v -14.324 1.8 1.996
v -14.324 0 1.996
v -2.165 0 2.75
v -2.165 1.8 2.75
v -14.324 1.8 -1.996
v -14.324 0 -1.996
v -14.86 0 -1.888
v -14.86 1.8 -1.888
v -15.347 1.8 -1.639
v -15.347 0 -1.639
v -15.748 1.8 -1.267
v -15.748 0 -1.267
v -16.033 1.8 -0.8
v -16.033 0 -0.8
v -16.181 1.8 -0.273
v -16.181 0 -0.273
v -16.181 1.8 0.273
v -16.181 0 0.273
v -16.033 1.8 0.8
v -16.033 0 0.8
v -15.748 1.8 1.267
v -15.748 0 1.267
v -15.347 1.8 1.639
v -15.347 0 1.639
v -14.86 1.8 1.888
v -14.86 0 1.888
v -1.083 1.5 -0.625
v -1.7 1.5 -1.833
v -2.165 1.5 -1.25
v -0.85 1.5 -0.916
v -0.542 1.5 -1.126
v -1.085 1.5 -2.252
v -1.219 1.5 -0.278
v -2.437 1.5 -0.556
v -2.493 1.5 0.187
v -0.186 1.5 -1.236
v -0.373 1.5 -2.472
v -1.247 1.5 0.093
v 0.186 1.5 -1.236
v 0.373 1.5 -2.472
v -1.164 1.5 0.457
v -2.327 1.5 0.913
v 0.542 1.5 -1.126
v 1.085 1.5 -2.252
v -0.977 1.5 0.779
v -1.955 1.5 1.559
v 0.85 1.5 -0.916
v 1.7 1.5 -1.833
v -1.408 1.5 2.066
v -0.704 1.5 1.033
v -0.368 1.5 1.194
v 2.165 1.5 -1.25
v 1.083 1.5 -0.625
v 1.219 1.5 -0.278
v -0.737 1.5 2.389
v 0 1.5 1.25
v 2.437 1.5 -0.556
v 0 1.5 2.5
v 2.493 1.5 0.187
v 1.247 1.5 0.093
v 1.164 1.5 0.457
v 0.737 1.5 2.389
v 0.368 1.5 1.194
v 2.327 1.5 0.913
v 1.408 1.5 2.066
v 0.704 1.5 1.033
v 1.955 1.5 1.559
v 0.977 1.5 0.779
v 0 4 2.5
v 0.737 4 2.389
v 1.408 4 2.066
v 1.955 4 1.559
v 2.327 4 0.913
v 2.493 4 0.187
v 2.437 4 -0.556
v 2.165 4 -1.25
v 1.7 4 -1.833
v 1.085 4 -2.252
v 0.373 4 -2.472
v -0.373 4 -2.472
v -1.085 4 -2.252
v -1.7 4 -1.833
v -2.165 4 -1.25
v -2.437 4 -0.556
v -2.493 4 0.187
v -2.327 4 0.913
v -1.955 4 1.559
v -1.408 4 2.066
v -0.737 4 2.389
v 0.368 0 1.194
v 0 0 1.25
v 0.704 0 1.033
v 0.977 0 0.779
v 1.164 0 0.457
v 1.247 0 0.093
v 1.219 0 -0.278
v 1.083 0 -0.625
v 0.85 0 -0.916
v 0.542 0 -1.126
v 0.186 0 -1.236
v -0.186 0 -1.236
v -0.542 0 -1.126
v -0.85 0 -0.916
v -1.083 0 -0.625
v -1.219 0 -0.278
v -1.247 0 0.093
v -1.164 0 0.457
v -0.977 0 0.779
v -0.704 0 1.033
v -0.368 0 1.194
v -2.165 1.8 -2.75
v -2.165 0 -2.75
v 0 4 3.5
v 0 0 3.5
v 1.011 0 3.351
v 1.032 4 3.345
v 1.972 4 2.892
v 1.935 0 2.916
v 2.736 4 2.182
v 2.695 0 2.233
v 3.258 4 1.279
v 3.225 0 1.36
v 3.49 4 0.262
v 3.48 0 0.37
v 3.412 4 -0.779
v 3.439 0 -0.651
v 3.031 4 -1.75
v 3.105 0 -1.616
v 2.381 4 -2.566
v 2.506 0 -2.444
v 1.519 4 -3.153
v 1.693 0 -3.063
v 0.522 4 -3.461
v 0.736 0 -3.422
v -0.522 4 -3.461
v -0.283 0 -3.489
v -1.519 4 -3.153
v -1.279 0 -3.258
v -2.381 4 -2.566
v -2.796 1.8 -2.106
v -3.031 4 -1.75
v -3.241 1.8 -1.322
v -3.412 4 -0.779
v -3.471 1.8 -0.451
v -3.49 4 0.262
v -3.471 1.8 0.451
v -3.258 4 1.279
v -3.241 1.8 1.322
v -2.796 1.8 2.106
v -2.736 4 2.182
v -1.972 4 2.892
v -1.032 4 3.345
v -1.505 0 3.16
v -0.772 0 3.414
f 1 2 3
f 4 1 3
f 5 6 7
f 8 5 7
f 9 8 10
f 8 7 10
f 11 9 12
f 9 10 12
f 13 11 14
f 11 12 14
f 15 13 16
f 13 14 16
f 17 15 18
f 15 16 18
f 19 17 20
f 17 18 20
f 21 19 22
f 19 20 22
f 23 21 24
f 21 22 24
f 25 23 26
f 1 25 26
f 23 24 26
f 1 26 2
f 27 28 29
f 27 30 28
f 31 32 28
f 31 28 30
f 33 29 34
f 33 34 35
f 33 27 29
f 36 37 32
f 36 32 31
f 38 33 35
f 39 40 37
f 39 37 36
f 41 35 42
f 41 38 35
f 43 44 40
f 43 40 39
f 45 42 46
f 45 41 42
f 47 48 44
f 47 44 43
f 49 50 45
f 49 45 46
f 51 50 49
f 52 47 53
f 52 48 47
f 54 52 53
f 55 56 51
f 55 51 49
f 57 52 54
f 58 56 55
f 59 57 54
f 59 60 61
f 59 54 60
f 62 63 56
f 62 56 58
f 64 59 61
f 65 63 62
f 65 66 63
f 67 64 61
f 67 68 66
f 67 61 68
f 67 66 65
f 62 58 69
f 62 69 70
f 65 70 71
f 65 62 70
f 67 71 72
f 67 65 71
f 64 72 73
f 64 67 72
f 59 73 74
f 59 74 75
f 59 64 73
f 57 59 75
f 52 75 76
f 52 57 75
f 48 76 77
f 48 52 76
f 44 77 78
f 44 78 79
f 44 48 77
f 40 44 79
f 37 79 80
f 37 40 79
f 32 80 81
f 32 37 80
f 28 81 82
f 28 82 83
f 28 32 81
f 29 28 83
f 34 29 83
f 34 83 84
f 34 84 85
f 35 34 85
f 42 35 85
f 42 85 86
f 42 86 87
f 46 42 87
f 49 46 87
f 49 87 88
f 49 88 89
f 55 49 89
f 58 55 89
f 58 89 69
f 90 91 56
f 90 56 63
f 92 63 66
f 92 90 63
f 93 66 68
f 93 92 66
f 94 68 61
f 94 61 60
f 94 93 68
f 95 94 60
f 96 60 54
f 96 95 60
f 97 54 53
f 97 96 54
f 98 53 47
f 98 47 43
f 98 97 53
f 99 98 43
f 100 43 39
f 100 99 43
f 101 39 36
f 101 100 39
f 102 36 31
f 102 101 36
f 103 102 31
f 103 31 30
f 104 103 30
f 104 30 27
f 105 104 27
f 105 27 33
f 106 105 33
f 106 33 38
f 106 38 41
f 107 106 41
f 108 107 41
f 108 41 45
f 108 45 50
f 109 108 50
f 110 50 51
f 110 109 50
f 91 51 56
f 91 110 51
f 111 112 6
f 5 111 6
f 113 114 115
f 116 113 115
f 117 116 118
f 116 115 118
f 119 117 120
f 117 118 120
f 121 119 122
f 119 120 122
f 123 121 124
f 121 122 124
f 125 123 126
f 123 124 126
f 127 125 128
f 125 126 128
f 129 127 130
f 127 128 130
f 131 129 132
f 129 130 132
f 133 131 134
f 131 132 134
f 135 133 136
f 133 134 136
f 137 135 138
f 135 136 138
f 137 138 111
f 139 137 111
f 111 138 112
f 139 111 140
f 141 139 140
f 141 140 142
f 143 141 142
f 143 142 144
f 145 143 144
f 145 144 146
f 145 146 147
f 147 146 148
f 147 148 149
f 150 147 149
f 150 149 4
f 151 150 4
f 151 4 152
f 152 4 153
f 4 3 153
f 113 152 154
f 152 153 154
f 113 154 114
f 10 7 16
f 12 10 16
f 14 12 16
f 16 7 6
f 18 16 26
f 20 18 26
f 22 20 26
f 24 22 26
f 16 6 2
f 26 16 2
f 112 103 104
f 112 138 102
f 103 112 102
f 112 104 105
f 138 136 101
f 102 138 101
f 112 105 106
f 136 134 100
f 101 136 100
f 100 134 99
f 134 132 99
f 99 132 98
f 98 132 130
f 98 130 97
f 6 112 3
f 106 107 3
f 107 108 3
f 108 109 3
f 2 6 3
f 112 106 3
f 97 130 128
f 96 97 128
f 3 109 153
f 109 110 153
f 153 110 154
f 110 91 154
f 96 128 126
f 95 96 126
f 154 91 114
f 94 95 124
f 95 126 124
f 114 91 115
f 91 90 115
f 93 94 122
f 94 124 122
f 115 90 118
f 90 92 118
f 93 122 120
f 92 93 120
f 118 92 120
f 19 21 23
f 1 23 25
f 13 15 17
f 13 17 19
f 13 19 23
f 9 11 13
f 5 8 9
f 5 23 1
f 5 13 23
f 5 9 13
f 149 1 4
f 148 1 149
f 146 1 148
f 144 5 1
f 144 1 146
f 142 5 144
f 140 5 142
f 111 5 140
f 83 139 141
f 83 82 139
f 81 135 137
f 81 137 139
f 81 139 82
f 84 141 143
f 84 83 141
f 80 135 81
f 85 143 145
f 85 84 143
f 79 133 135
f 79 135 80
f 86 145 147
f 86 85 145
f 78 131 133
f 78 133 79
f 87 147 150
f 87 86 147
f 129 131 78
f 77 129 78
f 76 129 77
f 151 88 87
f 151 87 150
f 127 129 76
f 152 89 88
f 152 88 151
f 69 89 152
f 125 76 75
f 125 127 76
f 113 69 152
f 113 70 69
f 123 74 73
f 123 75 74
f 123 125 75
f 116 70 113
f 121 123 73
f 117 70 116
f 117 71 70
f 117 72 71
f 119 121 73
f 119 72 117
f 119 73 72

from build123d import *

# Parameters (mm, degrees)
SKETCH1_R           = 3.5
SKETCH1_R_2         = 2.5
BOSS_EXTRUDE1_DEPTH = 4
BOSS_EXTRUDE2_DEPTH = 1.8
SKETCH3_R           = 2.5
SKETCH3_R_2         = 1.25
BOSS_EXTRUDE3_DEPTH = 1.5


with BuildPart() as part:
    # Sketch1 → Boss-Extrude1 (new body)
    with BuildSketch(Plane(origin=(0, 0, 0), x_dir=(1, 0, 0), z_dir=(0, 1, 0))):
        with Locations(Location((0, 0, 0), (0, 0, 270))):
            Circle(SKETCH1_R)
        with Locations(Location((0, 0, 0), (0, 0, 270))):
            Circle(SKETCH1_R_2, mode=Mode.SUBTRACT)
    extrude(amount=BOSS_EXTRUDE1_DEPTH)

    # Sketch2 → Boss-Extrude2 (add)
    with BuildSketch(Plane(origin=(0, 0, 0), x_dir=(1, 0, 0), z_dir=(0, 1, 0))):
        with BuildLine():
            Line((-2.165063509, 2.75), (-14.323761314, 1.996167112))
            ThreePointArc((-14.323761314, 1.996167112), (-16.2, 0), (-14.323761314, -1.996167112))
            Line((-14.323761314, -1.996167112), (-2.165063509, -2.75))
            ThreePointArc((-2.165063509, -2.75), (-3.5, 0), (-2.165063509, 2.75))
        make_face()
    extrude(amount=BOSS_EXTRUDE2_DEPTH)

    # Sketch3 → Boss-Extrude3 (add)
    with BuildSketch(Plane(origin=(0, 0, 0), x_dir=(1, 0, 0), z_dir=(0, 1, 0))):
        with Locations(Location((0, 0, 0), (0, 0, 270))):
            Circle(SKETCH3_R)
        with Locations(Location((0, 0, 0), (0, 0, 270))):
            Circle(SKETCH3_R_2, mode=Mode.SUBTRACT)
    extrude(amount=BOSS_EXTRUDE3_DEPTH)


solid = part.part
